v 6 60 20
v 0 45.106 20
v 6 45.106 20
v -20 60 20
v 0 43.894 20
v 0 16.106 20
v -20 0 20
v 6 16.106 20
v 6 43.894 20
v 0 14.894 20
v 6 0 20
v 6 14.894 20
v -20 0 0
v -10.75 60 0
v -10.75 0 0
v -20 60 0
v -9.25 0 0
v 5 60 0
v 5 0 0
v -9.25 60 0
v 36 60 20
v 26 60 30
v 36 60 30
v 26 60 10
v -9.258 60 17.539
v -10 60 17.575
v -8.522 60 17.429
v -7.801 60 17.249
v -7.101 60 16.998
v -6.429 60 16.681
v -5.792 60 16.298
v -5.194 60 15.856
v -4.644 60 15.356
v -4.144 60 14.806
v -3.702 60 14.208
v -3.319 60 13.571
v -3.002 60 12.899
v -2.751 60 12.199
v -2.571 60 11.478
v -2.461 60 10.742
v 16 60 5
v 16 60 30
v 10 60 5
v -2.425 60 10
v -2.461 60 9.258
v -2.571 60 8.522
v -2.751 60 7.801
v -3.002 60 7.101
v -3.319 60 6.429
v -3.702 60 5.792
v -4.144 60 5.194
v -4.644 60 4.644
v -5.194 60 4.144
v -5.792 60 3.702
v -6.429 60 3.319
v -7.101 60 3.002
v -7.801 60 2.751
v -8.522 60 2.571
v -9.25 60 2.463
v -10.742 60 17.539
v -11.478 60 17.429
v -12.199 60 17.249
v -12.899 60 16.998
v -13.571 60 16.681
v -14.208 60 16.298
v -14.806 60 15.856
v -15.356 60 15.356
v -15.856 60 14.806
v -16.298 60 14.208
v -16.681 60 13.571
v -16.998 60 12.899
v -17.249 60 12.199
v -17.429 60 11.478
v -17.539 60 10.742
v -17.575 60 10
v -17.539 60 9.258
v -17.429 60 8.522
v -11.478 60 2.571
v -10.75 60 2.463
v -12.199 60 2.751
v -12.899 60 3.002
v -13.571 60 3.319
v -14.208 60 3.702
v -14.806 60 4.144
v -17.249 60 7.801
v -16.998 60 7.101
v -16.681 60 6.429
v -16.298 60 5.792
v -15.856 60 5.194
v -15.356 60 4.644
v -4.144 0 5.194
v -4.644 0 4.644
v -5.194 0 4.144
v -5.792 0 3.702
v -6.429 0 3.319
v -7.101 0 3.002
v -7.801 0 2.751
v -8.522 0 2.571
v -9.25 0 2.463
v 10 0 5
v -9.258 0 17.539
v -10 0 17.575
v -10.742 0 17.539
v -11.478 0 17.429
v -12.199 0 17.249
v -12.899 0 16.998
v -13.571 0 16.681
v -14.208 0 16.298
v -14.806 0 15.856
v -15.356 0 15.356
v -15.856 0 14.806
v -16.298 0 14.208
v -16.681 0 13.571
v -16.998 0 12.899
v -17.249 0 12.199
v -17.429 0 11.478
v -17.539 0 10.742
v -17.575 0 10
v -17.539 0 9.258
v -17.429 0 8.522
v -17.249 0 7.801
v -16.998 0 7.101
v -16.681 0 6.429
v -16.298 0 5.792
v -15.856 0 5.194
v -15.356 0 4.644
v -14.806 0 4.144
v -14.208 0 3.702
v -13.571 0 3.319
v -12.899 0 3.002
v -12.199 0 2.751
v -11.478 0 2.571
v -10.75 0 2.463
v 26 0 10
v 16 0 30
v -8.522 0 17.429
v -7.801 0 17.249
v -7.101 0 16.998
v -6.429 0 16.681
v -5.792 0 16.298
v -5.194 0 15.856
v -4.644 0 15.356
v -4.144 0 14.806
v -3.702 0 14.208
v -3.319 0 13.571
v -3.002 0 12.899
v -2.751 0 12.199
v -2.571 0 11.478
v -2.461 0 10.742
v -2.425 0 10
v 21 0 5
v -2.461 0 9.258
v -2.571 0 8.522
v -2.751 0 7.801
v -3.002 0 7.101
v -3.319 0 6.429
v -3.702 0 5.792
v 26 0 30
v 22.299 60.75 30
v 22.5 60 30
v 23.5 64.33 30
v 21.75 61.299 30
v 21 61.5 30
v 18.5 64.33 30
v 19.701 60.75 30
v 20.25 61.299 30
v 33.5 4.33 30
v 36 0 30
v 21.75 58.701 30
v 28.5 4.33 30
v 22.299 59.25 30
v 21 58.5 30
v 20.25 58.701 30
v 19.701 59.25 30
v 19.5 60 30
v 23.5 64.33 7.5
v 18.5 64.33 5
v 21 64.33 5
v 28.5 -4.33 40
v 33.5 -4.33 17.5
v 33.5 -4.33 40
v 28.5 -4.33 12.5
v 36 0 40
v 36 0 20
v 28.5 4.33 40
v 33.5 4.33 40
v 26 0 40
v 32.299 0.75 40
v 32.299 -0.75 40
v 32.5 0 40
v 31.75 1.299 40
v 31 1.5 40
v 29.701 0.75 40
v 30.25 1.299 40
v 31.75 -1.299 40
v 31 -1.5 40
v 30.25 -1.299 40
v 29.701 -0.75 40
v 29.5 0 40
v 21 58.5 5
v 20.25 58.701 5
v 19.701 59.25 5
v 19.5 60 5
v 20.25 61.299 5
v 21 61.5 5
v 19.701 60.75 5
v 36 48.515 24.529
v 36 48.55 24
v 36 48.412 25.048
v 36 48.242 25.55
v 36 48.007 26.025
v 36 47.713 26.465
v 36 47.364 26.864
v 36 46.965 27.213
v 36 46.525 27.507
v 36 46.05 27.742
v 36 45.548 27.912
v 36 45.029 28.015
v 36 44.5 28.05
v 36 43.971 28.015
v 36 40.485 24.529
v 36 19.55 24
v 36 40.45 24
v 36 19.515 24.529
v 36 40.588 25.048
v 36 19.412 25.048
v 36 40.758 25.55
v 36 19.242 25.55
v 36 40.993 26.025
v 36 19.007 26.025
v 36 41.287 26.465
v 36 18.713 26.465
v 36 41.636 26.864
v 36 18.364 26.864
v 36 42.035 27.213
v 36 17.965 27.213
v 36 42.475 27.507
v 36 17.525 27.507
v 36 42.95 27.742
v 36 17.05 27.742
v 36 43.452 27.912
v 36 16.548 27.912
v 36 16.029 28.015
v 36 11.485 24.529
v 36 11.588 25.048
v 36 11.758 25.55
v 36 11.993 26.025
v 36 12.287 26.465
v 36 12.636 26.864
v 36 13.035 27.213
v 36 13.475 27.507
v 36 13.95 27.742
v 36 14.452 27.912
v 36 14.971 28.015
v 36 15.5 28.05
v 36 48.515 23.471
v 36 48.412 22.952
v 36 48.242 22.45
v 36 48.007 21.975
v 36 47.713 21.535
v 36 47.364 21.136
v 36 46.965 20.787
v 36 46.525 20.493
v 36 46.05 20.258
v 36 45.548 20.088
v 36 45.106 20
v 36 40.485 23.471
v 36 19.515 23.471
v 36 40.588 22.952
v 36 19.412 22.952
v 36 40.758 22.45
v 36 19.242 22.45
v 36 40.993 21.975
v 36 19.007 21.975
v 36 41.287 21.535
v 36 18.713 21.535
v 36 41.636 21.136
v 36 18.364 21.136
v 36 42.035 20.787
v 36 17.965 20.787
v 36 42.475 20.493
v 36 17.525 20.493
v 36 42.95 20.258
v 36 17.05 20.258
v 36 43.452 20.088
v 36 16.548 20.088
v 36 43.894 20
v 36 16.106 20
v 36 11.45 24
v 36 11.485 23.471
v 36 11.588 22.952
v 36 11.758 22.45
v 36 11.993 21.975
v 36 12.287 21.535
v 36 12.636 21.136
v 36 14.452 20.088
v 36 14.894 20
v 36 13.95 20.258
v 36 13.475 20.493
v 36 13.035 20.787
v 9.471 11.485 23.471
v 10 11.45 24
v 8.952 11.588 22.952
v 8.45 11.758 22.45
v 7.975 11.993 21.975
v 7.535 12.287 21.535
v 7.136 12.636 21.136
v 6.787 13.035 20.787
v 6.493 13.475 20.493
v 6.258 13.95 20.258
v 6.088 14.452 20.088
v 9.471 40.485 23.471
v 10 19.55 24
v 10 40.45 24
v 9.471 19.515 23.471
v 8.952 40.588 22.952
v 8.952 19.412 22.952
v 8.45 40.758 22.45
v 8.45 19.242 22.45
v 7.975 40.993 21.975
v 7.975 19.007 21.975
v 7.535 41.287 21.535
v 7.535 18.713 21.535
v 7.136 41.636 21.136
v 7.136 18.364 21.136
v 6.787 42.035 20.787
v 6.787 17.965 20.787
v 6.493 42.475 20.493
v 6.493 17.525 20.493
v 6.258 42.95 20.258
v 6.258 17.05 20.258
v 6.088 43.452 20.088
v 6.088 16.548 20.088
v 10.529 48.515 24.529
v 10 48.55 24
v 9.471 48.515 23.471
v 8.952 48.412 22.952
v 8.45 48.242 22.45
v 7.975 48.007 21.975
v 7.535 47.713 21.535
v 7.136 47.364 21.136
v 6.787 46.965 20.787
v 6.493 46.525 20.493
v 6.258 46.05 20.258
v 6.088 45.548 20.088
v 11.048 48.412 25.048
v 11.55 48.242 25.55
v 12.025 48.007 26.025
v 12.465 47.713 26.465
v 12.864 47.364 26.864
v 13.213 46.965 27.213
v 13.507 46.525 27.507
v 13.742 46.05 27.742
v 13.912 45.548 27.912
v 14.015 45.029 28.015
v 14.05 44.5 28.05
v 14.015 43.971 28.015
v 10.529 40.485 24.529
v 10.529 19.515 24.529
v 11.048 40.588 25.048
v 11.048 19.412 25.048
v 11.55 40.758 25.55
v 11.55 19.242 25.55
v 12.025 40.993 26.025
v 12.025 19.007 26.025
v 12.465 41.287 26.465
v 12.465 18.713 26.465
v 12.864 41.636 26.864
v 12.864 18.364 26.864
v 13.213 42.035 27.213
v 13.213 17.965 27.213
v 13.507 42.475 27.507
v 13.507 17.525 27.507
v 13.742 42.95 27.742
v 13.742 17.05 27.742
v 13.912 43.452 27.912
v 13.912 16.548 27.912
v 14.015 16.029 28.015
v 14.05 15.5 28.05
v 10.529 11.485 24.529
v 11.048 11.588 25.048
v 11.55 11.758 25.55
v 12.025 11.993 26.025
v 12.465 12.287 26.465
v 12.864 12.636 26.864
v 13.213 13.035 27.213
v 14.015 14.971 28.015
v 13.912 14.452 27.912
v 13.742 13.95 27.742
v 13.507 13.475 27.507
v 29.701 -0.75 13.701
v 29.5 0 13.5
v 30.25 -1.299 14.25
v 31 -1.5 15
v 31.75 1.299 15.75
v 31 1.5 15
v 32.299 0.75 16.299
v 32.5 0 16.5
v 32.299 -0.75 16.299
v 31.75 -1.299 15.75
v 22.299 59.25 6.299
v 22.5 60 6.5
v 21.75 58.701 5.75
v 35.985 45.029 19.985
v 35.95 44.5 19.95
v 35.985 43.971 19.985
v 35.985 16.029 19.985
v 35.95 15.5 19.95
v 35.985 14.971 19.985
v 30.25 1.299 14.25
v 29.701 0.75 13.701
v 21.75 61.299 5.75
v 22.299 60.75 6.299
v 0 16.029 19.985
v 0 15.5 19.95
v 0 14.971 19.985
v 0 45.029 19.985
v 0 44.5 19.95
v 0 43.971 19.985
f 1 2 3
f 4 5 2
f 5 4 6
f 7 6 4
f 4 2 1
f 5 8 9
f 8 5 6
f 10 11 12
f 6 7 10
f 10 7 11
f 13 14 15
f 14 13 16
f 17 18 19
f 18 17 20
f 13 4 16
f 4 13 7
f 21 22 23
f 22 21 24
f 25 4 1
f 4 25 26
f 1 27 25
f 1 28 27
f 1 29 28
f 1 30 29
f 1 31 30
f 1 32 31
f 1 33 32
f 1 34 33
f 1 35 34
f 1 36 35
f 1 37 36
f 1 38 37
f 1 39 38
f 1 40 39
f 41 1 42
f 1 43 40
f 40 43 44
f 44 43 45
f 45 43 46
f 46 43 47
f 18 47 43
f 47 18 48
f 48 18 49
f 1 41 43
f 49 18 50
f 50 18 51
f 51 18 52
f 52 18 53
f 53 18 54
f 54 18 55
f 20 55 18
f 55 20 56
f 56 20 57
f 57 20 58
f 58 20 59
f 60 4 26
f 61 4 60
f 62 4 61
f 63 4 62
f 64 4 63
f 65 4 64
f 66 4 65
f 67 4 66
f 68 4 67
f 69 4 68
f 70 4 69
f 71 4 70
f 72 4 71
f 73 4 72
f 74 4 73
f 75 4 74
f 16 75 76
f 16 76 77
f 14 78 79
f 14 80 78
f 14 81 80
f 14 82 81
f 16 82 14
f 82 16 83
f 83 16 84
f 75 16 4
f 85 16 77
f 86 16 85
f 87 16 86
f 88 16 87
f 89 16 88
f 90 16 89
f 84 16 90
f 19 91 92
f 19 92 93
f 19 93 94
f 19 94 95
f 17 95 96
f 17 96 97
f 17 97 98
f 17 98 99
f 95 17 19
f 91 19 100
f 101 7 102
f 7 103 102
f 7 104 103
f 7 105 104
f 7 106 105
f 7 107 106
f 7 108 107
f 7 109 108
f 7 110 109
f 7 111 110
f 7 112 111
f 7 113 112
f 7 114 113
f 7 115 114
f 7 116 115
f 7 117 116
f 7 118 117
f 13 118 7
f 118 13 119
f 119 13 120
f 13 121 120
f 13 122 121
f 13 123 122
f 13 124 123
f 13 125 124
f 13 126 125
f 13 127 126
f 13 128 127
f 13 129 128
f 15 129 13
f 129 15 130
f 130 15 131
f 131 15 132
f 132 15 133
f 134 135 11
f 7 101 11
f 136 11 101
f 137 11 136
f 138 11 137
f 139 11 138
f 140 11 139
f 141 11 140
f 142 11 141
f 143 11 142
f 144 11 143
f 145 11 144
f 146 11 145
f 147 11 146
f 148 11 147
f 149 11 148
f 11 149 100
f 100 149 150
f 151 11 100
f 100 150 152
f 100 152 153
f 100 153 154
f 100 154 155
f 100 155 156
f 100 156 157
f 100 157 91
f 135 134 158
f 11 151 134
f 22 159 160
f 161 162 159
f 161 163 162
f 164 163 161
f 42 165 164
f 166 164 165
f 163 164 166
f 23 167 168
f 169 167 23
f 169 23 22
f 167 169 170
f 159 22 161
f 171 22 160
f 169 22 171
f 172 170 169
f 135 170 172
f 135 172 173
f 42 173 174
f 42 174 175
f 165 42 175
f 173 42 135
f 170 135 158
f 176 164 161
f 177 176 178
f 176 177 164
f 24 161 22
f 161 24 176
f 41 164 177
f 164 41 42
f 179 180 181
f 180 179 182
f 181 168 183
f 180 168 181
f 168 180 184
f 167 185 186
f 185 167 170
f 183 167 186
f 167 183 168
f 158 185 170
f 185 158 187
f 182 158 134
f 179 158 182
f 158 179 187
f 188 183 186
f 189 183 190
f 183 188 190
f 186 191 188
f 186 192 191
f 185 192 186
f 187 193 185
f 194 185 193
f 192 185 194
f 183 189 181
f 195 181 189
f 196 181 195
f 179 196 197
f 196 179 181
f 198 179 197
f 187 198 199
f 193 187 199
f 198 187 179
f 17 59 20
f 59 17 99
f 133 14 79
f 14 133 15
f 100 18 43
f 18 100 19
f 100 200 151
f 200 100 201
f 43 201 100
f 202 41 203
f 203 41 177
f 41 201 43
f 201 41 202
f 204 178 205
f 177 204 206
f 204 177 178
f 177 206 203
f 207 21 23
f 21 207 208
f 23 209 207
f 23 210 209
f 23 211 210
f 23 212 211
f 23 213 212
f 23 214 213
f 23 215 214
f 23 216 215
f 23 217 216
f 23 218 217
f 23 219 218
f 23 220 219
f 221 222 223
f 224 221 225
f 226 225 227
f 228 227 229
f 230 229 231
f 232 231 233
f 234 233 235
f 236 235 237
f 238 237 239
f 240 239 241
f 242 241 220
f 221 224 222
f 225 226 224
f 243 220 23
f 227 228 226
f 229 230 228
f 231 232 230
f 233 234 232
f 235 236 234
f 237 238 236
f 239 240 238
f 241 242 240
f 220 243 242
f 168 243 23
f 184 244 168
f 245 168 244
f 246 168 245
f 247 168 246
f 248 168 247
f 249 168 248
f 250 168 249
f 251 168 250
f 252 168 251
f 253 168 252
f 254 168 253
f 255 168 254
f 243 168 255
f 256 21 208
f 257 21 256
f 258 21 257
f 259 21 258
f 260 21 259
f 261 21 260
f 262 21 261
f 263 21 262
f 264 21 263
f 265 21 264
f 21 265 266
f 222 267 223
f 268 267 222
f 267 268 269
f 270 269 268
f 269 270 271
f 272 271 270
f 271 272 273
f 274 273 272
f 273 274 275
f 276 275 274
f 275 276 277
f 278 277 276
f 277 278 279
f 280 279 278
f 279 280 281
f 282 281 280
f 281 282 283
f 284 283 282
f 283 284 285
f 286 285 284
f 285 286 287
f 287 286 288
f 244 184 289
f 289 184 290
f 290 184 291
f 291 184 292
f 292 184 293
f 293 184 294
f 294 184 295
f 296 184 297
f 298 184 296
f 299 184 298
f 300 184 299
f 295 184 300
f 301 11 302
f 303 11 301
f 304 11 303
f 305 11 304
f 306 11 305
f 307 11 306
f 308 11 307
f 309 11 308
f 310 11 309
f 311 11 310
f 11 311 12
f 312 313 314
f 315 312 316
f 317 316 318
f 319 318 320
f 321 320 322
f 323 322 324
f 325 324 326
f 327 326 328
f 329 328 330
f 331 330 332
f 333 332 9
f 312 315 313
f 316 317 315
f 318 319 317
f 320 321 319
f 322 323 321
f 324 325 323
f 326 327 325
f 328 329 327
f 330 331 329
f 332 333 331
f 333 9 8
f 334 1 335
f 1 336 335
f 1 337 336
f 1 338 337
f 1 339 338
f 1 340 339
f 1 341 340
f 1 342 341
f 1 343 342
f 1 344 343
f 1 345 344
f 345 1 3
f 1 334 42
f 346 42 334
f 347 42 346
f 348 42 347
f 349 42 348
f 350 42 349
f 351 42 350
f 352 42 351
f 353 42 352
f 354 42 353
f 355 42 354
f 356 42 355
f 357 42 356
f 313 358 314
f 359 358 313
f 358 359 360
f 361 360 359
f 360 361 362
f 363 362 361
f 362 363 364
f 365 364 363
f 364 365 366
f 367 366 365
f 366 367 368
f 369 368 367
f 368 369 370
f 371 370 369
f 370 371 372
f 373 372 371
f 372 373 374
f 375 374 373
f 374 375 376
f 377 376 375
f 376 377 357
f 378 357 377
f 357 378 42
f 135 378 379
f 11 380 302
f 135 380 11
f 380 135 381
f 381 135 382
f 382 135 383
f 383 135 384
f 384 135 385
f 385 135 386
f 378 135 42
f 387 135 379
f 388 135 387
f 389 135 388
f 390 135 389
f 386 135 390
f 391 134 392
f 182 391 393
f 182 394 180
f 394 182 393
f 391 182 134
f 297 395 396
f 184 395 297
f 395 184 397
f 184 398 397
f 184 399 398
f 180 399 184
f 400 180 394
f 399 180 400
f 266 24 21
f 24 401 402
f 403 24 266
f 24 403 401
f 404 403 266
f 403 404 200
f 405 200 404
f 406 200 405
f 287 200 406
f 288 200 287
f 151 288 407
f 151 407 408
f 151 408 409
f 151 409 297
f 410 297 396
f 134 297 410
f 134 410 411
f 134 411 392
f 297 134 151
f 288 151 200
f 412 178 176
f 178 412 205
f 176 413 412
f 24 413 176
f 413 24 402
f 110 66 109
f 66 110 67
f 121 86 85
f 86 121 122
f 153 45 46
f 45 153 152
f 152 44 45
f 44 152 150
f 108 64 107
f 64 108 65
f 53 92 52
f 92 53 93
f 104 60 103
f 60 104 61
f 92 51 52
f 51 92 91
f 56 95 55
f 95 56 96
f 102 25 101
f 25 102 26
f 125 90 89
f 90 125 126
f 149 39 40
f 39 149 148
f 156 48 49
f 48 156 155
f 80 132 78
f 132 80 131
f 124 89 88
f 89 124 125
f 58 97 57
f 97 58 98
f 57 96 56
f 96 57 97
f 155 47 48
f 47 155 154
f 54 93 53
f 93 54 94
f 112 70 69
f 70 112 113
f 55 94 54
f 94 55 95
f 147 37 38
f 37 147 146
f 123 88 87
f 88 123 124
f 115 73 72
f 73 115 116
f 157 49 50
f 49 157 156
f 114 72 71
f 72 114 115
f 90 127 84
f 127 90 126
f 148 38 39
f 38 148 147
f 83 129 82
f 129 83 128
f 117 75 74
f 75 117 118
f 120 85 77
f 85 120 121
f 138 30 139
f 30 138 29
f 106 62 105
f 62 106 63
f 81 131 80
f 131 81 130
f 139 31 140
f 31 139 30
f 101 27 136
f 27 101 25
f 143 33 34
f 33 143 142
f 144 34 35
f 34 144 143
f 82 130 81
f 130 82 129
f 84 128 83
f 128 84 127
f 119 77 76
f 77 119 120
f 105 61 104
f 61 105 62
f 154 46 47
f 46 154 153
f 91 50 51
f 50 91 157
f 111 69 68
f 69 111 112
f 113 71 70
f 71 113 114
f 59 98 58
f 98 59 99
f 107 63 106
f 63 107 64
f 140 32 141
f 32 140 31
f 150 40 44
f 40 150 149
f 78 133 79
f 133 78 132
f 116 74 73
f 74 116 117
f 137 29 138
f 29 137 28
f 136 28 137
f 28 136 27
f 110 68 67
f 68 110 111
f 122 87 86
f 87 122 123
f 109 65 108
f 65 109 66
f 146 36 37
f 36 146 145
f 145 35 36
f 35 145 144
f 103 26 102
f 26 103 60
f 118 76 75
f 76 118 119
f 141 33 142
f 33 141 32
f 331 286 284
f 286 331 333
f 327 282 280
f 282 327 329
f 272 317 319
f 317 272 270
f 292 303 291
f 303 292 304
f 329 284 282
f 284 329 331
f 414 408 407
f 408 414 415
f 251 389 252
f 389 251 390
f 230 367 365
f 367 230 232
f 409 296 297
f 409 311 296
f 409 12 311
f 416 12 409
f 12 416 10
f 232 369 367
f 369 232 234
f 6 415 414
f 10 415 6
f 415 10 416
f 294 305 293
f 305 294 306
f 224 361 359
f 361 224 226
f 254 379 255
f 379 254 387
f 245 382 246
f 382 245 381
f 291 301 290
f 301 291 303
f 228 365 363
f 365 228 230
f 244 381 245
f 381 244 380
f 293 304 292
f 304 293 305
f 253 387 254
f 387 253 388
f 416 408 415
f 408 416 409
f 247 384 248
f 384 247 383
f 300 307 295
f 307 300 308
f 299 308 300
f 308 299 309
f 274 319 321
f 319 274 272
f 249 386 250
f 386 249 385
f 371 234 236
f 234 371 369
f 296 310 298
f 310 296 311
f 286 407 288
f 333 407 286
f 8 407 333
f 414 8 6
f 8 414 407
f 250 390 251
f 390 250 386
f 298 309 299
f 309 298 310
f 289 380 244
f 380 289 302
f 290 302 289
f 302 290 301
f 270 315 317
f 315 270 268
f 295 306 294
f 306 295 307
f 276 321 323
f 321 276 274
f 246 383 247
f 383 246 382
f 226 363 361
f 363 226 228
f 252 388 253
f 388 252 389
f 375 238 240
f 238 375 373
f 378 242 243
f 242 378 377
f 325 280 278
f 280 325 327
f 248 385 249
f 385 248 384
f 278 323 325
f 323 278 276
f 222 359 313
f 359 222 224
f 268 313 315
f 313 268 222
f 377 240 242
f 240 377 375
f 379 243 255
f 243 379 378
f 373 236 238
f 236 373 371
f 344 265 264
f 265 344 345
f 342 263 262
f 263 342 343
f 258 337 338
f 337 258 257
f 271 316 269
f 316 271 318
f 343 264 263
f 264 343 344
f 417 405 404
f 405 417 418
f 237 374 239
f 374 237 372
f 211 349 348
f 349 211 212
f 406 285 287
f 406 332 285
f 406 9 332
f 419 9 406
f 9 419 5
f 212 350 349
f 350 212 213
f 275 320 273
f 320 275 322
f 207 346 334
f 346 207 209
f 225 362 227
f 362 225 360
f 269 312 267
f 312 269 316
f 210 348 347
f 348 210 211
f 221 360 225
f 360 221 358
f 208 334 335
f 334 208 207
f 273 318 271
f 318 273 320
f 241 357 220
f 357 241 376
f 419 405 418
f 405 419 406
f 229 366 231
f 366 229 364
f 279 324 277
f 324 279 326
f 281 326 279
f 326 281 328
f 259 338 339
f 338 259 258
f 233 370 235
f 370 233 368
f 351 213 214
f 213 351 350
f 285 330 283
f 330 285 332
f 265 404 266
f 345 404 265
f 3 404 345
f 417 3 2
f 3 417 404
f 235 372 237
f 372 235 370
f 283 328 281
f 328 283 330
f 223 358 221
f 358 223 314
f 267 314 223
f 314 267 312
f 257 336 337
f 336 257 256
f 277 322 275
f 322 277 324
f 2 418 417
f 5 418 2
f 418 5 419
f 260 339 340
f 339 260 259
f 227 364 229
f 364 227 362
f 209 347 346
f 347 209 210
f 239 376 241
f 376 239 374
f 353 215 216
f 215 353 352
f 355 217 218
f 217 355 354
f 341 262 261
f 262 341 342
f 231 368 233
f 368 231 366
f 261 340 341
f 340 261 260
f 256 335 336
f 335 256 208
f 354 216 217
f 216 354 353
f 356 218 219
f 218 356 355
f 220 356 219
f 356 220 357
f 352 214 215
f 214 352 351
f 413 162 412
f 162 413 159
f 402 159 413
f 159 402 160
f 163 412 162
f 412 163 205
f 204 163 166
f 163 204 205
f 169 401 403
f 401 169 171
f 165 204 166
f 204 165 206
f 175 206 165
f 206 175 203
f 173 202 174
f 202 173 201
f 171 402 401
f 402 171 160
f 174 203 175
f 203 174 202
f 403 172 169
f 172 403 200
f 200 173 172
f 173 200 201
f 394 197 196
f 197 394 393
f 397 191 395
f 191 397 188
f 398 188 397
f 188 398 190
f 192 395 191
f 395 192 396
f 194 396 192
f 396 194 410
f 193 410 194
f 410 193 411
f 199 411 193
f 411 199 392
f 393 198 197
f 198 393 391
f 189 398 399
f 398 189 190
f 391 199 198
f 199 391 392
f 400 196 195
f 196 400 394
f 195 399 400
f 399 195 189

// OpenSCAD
difference()
{
    union()
    {
        translate([-20,0,0])
            cube([20,60,20]);
        
        cube([42,60,20]);
        
        translate([6,0,20])
            cube([42,60,10]);
        
        translate([21,60/2+30,0])
            cylinder(d=10,h=20+10,$fn=6);
        
        translate([21+5+5,60/2-30,0])
            cylinder(d=10,h=20+10+10,$fn=6);
    }
    union()
    {
        translate([-10-1.5/2,0,0])
            cube([1.5,60,5]);
        
        translate([5,0,0])
            rotate([0,45,0])
                cube([5*sqrt(2),60,5*sqrt(2)]);
        
        translate([10,0,0])
            cube([12,70,5]);
        
        translate([36,0,0])
            cube([20,60,50]);
        
        translate([6,0,20])
            rotate([0,45+270,0])
                cube([20,60,20]);
        
        translate([21-5,-10,0])
            rotate([0,45,0])
                cube([40,80,40]);
        
        translate([-10,0,10])
            rotate([270,0,0])
                cylinder(d=15.15,h=60,$fn=64);
        
        translate([0,60/2-29/2,20+4])
            rotate([0,90,0])
                cylinder(d=8.1,h=50,$fn=48);
        translate([0,60/2+29/2,20+4])
            rotate([0,90,0])
                cylinder(d=8.1,h=50,$fn=48);
        
        translate([21,60/2+30,0])
            cylinder(d=3,h=20+10,$fn=12);
        
        translate([21+5+5,60/2-30,0])
            cylinder(d=3,h=20+10+10,$fn=12);
        
        //translate([21-5,-10,0])
          //  cube([10,60+20,10]);
        
    }
}
